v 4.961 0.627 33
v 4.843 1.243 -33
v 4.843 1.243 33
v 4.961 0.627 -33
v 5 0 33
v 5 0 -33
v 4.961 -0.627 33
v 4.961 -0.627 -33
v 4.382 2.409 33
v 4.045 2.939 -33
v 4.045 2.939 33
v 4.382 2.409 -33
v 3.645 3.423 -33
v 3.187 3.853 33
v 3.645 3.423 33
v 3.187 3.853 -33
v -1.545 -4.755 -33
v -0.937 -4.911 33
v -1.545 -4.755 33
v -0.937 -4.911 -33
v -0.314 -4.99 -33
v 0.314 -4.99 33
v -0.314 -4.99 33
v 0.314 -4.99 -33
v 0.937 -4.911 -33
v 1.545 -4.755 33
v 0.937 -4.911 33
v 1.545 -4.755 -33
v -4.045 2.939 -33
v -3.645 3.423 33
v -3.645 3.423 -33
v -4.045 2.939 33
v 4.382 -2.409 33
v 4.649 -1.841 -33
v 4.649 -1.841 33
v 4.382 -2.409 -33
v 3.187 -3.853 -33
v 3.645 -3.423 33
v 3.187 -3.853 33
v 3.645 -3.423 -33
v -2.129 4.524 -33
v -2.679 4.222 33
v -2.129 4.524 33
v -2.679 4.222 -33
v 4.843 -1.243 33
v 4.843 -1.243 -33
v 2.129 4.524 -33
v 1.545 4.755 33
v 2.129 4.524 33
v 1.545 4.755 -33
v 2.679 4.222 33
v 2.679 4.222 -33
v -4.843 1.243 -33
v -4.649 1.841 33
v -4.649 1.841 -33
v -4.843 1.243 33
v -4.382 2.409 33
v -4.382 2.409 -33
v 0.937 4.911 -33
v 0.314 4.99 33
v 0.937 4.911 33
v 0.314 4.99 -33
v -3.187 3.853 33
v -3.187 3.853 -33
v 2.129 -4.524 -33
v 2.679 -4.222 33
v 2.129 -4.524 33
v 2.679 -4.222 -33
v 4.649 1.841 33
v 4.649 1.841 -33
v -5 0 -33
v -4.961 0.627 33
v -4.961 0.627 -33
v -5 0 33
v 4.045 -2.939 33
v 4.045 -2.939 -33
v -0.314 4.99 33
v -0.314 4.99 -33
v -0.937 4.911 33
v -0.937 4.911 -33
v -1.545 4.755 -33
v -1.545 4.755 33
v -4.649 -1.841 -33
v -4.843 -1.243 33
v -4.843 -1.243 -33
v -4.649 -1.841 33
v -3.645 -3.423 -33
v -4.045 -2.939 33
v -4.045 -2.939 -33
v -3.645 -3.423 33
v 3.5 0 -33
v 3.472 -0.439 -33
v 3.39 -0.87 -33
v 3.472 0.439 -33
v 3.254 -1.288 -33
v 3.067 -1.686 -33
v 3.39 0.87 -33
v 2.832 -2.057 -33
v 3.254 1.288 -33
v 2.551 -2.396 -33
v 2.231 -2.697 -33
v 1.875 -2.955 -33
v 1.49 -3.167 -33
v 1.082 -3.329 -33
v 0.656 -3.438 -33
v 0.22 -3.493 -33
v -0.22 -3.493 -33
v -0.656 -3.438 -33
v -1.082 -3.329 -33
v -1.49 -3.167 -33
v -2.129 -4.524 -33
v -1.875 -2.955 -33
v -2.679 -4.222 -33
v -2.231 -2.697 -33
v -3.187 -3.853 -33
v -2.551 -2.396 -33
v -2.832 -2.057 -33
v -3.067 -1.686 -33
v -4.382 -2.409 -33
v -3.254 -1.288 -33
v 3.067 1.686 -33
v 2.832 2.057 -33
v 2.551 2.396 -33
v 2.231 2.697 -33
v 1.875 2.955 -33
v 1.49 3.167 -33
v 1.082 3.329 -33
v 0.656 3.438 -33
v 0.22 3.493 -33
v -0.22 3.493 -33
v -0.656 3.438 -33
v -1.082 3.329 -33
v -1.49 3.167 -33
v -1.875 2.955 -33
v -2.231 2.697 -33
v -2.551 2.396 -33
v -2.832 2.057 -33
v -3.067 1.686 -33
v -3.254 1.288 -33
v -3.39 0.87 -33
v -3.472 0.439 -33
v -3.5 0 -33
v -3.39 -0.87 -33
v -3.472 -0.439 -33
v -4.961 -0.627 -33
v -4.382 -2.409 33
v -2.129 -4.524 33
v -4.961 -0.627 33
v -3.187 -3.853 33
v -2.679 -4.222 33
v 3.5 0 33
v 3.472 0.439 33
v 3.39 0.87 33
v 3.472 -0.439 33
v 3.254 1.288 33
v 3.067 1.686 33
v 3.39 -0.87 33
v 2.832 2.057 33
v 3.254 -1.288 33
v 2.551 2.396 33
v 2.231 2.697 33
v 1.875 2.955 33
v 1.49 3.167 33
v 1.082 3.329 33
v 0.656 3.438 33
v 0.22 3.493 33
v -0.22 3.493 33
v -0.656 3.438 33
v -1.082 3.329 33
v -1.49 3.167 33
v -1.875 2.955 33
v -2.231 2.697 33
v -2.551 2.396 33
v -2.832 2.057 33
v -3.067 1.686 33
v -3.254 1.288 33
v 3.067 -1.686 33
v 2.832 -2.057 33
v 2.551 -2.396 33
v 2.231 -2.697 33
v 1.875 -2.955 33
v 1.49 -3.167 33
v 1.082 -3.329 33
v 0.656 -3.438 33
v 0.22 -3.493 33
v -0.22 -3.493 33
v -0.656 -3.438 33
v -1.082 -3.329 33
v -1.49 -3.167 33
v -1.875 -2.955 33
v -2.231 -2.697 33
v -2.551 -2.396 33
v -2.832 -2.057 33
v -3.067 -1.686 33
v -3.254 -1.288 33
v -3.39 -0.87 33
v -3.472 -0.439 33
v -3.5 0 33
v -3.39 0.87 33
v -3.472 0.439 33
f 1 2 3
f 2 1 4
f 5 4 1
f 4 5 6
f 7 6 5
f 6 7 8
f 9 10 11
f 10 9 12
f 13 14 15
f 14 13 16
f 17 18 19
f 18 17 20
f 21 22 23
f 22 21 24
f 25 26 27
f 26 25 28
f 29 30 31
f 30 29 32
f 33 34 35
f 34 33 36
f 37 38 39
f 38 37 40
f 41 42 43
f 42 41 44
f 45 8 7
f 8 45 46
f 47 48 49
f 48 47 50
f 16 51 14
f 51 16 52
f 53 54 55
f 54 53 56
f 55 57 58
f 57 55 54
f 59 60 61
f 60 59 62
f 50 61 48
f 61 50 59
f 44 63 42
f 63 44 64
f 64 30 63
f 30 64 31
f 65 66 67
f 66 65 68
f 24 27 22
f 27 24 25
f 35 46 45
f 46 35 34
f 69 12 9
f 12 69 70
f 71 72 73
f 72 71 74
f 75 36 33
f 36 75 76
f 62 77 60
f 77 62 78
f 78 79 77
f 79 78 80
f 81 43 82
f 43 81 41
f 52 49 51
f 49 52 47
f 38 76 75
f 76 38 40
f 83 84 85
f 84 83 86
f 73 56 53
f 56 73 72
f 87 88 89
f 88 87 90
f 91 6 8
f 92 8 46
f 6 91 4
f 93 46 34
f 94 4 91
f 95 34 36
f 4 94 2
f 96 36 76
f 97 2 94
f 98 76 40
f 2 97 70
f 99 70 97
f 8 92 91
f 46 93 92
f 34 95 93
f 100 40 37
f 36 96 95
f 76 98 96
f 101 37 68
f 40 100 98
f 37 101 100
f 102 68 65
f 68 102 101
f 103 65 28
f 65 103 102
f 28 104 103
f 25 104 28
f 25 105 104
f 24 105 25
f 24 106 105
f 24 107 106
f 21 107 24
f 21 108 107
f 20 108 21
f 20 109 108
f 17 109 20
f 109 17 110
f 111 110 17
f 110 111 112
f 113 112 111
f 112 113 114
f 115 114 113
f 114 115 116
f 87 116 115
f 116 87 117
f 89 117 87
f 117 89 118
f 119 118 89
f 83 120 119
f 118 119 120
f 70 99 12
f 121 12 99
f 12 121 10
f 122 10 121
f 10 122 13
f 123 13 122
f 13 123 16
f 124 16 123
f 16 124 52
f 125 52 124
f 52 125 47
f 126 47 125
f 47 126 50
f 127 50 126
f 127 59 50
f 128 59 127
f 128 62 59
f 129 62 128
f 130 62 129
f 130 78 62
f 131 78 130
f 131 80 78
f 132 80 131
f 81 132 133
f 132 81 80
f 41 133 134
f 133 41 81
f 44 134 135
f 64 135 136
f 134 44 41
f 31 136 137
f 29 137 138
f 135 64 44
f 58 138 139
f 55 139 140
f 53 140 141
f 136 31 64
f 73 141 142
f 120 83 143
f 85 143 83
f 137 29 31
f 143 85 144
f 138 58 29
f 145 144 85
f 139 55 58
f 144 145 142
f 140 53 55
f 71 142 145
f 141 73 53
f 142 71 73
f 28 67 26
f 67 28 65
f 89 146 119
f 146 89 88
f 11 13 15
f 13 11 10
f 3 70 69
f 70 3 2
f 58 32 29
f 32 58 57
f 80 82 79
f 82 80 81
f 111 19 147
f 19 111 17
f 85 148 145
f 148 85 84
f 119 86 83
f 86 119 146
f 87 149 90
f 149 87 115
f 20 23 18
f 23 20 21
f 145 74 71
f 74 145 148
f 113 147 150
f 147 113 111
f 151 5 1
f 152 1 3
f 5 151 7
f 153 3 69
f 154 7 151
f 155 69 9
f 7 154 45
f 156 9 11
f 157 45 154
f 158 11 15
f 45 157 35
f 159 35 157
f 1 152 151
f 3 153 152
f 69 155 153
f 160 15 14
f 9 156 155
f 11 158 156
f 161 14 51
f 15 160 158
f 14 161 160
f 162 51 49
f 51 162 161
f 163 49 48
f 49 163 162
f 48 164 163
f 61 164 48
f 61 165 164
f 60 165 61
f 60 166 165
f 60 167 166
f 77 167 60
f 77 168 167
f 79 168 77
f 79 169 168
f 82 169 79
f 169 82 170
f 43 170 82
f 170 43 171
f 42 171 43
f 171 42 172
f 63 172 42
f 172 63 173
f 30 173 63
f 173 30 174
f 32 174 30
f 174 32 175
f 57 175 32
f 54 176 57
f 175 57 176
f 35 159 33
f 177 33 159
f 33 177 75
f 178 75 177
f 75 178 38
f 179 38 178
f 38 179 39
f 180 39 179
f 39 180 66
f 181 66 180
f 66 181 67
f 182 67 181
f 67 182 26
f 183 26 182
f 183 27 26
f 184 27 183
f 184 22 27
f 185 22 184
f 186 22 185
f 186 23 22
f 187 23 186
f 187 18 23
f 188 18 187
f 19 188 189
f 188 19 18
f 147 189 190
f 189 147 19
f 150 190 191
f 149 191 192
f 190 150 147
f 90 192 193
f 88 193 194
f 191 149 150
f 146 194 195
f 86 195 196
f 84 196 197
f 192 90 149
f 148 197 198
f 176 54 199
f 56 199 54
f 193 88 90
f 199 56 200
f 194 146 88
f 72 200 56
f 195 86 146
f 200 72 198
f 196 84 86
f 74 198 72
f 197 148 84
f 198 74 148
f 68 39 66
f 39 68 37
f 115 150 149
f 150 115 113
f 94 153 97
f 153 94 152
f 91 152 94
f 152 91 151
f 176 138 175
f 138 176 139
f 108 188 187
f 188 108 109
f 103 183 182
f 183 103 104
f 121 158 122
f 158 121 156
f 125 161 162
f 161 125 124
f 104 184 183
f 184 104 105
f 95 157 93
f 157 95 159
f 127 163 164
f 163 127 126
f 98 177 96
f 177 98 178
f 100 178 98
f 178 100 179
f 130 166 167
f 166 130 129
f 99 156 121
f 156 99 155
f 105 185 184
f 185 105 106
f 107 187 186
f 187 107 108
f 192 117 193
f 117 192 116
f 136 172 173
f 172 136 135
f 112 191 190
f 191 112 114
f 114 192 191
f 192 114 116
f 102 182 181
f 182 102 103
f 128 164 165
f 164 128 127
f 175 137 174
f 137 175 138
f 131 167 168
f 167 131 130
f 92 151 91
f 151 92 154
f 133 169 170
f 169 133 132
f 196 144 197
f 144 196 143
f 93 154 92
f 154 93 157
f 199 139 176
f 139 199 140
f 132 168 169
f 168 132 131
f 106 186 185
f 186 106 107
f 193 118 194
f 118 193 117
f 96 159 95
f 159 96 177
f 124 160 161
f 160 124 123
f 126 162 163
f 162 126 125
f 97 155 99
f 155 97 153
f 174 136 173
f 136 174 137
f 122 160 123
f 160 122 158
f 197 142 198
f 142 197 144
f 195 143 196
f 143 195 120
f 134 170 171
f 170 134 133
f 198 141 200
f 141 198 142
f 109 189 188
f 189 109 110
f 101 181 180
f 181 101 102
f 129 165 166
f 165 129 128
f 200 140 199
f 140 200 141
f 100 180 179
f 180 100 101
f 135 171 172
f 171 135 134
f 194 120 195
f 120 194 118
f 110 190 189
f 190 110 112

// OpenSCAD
$fn = 50;


difference() {
	union() {
		translate(v = [0, 0, -33.0000000000]) {
			cylinder(h = 66, r = 5.0000000000);
		}
	}
	union() {
		translate(v = [0, 0, -100.0000000000]) {
			cylinder(h = 200, r = 3.5000000000);
		}
	}
}
